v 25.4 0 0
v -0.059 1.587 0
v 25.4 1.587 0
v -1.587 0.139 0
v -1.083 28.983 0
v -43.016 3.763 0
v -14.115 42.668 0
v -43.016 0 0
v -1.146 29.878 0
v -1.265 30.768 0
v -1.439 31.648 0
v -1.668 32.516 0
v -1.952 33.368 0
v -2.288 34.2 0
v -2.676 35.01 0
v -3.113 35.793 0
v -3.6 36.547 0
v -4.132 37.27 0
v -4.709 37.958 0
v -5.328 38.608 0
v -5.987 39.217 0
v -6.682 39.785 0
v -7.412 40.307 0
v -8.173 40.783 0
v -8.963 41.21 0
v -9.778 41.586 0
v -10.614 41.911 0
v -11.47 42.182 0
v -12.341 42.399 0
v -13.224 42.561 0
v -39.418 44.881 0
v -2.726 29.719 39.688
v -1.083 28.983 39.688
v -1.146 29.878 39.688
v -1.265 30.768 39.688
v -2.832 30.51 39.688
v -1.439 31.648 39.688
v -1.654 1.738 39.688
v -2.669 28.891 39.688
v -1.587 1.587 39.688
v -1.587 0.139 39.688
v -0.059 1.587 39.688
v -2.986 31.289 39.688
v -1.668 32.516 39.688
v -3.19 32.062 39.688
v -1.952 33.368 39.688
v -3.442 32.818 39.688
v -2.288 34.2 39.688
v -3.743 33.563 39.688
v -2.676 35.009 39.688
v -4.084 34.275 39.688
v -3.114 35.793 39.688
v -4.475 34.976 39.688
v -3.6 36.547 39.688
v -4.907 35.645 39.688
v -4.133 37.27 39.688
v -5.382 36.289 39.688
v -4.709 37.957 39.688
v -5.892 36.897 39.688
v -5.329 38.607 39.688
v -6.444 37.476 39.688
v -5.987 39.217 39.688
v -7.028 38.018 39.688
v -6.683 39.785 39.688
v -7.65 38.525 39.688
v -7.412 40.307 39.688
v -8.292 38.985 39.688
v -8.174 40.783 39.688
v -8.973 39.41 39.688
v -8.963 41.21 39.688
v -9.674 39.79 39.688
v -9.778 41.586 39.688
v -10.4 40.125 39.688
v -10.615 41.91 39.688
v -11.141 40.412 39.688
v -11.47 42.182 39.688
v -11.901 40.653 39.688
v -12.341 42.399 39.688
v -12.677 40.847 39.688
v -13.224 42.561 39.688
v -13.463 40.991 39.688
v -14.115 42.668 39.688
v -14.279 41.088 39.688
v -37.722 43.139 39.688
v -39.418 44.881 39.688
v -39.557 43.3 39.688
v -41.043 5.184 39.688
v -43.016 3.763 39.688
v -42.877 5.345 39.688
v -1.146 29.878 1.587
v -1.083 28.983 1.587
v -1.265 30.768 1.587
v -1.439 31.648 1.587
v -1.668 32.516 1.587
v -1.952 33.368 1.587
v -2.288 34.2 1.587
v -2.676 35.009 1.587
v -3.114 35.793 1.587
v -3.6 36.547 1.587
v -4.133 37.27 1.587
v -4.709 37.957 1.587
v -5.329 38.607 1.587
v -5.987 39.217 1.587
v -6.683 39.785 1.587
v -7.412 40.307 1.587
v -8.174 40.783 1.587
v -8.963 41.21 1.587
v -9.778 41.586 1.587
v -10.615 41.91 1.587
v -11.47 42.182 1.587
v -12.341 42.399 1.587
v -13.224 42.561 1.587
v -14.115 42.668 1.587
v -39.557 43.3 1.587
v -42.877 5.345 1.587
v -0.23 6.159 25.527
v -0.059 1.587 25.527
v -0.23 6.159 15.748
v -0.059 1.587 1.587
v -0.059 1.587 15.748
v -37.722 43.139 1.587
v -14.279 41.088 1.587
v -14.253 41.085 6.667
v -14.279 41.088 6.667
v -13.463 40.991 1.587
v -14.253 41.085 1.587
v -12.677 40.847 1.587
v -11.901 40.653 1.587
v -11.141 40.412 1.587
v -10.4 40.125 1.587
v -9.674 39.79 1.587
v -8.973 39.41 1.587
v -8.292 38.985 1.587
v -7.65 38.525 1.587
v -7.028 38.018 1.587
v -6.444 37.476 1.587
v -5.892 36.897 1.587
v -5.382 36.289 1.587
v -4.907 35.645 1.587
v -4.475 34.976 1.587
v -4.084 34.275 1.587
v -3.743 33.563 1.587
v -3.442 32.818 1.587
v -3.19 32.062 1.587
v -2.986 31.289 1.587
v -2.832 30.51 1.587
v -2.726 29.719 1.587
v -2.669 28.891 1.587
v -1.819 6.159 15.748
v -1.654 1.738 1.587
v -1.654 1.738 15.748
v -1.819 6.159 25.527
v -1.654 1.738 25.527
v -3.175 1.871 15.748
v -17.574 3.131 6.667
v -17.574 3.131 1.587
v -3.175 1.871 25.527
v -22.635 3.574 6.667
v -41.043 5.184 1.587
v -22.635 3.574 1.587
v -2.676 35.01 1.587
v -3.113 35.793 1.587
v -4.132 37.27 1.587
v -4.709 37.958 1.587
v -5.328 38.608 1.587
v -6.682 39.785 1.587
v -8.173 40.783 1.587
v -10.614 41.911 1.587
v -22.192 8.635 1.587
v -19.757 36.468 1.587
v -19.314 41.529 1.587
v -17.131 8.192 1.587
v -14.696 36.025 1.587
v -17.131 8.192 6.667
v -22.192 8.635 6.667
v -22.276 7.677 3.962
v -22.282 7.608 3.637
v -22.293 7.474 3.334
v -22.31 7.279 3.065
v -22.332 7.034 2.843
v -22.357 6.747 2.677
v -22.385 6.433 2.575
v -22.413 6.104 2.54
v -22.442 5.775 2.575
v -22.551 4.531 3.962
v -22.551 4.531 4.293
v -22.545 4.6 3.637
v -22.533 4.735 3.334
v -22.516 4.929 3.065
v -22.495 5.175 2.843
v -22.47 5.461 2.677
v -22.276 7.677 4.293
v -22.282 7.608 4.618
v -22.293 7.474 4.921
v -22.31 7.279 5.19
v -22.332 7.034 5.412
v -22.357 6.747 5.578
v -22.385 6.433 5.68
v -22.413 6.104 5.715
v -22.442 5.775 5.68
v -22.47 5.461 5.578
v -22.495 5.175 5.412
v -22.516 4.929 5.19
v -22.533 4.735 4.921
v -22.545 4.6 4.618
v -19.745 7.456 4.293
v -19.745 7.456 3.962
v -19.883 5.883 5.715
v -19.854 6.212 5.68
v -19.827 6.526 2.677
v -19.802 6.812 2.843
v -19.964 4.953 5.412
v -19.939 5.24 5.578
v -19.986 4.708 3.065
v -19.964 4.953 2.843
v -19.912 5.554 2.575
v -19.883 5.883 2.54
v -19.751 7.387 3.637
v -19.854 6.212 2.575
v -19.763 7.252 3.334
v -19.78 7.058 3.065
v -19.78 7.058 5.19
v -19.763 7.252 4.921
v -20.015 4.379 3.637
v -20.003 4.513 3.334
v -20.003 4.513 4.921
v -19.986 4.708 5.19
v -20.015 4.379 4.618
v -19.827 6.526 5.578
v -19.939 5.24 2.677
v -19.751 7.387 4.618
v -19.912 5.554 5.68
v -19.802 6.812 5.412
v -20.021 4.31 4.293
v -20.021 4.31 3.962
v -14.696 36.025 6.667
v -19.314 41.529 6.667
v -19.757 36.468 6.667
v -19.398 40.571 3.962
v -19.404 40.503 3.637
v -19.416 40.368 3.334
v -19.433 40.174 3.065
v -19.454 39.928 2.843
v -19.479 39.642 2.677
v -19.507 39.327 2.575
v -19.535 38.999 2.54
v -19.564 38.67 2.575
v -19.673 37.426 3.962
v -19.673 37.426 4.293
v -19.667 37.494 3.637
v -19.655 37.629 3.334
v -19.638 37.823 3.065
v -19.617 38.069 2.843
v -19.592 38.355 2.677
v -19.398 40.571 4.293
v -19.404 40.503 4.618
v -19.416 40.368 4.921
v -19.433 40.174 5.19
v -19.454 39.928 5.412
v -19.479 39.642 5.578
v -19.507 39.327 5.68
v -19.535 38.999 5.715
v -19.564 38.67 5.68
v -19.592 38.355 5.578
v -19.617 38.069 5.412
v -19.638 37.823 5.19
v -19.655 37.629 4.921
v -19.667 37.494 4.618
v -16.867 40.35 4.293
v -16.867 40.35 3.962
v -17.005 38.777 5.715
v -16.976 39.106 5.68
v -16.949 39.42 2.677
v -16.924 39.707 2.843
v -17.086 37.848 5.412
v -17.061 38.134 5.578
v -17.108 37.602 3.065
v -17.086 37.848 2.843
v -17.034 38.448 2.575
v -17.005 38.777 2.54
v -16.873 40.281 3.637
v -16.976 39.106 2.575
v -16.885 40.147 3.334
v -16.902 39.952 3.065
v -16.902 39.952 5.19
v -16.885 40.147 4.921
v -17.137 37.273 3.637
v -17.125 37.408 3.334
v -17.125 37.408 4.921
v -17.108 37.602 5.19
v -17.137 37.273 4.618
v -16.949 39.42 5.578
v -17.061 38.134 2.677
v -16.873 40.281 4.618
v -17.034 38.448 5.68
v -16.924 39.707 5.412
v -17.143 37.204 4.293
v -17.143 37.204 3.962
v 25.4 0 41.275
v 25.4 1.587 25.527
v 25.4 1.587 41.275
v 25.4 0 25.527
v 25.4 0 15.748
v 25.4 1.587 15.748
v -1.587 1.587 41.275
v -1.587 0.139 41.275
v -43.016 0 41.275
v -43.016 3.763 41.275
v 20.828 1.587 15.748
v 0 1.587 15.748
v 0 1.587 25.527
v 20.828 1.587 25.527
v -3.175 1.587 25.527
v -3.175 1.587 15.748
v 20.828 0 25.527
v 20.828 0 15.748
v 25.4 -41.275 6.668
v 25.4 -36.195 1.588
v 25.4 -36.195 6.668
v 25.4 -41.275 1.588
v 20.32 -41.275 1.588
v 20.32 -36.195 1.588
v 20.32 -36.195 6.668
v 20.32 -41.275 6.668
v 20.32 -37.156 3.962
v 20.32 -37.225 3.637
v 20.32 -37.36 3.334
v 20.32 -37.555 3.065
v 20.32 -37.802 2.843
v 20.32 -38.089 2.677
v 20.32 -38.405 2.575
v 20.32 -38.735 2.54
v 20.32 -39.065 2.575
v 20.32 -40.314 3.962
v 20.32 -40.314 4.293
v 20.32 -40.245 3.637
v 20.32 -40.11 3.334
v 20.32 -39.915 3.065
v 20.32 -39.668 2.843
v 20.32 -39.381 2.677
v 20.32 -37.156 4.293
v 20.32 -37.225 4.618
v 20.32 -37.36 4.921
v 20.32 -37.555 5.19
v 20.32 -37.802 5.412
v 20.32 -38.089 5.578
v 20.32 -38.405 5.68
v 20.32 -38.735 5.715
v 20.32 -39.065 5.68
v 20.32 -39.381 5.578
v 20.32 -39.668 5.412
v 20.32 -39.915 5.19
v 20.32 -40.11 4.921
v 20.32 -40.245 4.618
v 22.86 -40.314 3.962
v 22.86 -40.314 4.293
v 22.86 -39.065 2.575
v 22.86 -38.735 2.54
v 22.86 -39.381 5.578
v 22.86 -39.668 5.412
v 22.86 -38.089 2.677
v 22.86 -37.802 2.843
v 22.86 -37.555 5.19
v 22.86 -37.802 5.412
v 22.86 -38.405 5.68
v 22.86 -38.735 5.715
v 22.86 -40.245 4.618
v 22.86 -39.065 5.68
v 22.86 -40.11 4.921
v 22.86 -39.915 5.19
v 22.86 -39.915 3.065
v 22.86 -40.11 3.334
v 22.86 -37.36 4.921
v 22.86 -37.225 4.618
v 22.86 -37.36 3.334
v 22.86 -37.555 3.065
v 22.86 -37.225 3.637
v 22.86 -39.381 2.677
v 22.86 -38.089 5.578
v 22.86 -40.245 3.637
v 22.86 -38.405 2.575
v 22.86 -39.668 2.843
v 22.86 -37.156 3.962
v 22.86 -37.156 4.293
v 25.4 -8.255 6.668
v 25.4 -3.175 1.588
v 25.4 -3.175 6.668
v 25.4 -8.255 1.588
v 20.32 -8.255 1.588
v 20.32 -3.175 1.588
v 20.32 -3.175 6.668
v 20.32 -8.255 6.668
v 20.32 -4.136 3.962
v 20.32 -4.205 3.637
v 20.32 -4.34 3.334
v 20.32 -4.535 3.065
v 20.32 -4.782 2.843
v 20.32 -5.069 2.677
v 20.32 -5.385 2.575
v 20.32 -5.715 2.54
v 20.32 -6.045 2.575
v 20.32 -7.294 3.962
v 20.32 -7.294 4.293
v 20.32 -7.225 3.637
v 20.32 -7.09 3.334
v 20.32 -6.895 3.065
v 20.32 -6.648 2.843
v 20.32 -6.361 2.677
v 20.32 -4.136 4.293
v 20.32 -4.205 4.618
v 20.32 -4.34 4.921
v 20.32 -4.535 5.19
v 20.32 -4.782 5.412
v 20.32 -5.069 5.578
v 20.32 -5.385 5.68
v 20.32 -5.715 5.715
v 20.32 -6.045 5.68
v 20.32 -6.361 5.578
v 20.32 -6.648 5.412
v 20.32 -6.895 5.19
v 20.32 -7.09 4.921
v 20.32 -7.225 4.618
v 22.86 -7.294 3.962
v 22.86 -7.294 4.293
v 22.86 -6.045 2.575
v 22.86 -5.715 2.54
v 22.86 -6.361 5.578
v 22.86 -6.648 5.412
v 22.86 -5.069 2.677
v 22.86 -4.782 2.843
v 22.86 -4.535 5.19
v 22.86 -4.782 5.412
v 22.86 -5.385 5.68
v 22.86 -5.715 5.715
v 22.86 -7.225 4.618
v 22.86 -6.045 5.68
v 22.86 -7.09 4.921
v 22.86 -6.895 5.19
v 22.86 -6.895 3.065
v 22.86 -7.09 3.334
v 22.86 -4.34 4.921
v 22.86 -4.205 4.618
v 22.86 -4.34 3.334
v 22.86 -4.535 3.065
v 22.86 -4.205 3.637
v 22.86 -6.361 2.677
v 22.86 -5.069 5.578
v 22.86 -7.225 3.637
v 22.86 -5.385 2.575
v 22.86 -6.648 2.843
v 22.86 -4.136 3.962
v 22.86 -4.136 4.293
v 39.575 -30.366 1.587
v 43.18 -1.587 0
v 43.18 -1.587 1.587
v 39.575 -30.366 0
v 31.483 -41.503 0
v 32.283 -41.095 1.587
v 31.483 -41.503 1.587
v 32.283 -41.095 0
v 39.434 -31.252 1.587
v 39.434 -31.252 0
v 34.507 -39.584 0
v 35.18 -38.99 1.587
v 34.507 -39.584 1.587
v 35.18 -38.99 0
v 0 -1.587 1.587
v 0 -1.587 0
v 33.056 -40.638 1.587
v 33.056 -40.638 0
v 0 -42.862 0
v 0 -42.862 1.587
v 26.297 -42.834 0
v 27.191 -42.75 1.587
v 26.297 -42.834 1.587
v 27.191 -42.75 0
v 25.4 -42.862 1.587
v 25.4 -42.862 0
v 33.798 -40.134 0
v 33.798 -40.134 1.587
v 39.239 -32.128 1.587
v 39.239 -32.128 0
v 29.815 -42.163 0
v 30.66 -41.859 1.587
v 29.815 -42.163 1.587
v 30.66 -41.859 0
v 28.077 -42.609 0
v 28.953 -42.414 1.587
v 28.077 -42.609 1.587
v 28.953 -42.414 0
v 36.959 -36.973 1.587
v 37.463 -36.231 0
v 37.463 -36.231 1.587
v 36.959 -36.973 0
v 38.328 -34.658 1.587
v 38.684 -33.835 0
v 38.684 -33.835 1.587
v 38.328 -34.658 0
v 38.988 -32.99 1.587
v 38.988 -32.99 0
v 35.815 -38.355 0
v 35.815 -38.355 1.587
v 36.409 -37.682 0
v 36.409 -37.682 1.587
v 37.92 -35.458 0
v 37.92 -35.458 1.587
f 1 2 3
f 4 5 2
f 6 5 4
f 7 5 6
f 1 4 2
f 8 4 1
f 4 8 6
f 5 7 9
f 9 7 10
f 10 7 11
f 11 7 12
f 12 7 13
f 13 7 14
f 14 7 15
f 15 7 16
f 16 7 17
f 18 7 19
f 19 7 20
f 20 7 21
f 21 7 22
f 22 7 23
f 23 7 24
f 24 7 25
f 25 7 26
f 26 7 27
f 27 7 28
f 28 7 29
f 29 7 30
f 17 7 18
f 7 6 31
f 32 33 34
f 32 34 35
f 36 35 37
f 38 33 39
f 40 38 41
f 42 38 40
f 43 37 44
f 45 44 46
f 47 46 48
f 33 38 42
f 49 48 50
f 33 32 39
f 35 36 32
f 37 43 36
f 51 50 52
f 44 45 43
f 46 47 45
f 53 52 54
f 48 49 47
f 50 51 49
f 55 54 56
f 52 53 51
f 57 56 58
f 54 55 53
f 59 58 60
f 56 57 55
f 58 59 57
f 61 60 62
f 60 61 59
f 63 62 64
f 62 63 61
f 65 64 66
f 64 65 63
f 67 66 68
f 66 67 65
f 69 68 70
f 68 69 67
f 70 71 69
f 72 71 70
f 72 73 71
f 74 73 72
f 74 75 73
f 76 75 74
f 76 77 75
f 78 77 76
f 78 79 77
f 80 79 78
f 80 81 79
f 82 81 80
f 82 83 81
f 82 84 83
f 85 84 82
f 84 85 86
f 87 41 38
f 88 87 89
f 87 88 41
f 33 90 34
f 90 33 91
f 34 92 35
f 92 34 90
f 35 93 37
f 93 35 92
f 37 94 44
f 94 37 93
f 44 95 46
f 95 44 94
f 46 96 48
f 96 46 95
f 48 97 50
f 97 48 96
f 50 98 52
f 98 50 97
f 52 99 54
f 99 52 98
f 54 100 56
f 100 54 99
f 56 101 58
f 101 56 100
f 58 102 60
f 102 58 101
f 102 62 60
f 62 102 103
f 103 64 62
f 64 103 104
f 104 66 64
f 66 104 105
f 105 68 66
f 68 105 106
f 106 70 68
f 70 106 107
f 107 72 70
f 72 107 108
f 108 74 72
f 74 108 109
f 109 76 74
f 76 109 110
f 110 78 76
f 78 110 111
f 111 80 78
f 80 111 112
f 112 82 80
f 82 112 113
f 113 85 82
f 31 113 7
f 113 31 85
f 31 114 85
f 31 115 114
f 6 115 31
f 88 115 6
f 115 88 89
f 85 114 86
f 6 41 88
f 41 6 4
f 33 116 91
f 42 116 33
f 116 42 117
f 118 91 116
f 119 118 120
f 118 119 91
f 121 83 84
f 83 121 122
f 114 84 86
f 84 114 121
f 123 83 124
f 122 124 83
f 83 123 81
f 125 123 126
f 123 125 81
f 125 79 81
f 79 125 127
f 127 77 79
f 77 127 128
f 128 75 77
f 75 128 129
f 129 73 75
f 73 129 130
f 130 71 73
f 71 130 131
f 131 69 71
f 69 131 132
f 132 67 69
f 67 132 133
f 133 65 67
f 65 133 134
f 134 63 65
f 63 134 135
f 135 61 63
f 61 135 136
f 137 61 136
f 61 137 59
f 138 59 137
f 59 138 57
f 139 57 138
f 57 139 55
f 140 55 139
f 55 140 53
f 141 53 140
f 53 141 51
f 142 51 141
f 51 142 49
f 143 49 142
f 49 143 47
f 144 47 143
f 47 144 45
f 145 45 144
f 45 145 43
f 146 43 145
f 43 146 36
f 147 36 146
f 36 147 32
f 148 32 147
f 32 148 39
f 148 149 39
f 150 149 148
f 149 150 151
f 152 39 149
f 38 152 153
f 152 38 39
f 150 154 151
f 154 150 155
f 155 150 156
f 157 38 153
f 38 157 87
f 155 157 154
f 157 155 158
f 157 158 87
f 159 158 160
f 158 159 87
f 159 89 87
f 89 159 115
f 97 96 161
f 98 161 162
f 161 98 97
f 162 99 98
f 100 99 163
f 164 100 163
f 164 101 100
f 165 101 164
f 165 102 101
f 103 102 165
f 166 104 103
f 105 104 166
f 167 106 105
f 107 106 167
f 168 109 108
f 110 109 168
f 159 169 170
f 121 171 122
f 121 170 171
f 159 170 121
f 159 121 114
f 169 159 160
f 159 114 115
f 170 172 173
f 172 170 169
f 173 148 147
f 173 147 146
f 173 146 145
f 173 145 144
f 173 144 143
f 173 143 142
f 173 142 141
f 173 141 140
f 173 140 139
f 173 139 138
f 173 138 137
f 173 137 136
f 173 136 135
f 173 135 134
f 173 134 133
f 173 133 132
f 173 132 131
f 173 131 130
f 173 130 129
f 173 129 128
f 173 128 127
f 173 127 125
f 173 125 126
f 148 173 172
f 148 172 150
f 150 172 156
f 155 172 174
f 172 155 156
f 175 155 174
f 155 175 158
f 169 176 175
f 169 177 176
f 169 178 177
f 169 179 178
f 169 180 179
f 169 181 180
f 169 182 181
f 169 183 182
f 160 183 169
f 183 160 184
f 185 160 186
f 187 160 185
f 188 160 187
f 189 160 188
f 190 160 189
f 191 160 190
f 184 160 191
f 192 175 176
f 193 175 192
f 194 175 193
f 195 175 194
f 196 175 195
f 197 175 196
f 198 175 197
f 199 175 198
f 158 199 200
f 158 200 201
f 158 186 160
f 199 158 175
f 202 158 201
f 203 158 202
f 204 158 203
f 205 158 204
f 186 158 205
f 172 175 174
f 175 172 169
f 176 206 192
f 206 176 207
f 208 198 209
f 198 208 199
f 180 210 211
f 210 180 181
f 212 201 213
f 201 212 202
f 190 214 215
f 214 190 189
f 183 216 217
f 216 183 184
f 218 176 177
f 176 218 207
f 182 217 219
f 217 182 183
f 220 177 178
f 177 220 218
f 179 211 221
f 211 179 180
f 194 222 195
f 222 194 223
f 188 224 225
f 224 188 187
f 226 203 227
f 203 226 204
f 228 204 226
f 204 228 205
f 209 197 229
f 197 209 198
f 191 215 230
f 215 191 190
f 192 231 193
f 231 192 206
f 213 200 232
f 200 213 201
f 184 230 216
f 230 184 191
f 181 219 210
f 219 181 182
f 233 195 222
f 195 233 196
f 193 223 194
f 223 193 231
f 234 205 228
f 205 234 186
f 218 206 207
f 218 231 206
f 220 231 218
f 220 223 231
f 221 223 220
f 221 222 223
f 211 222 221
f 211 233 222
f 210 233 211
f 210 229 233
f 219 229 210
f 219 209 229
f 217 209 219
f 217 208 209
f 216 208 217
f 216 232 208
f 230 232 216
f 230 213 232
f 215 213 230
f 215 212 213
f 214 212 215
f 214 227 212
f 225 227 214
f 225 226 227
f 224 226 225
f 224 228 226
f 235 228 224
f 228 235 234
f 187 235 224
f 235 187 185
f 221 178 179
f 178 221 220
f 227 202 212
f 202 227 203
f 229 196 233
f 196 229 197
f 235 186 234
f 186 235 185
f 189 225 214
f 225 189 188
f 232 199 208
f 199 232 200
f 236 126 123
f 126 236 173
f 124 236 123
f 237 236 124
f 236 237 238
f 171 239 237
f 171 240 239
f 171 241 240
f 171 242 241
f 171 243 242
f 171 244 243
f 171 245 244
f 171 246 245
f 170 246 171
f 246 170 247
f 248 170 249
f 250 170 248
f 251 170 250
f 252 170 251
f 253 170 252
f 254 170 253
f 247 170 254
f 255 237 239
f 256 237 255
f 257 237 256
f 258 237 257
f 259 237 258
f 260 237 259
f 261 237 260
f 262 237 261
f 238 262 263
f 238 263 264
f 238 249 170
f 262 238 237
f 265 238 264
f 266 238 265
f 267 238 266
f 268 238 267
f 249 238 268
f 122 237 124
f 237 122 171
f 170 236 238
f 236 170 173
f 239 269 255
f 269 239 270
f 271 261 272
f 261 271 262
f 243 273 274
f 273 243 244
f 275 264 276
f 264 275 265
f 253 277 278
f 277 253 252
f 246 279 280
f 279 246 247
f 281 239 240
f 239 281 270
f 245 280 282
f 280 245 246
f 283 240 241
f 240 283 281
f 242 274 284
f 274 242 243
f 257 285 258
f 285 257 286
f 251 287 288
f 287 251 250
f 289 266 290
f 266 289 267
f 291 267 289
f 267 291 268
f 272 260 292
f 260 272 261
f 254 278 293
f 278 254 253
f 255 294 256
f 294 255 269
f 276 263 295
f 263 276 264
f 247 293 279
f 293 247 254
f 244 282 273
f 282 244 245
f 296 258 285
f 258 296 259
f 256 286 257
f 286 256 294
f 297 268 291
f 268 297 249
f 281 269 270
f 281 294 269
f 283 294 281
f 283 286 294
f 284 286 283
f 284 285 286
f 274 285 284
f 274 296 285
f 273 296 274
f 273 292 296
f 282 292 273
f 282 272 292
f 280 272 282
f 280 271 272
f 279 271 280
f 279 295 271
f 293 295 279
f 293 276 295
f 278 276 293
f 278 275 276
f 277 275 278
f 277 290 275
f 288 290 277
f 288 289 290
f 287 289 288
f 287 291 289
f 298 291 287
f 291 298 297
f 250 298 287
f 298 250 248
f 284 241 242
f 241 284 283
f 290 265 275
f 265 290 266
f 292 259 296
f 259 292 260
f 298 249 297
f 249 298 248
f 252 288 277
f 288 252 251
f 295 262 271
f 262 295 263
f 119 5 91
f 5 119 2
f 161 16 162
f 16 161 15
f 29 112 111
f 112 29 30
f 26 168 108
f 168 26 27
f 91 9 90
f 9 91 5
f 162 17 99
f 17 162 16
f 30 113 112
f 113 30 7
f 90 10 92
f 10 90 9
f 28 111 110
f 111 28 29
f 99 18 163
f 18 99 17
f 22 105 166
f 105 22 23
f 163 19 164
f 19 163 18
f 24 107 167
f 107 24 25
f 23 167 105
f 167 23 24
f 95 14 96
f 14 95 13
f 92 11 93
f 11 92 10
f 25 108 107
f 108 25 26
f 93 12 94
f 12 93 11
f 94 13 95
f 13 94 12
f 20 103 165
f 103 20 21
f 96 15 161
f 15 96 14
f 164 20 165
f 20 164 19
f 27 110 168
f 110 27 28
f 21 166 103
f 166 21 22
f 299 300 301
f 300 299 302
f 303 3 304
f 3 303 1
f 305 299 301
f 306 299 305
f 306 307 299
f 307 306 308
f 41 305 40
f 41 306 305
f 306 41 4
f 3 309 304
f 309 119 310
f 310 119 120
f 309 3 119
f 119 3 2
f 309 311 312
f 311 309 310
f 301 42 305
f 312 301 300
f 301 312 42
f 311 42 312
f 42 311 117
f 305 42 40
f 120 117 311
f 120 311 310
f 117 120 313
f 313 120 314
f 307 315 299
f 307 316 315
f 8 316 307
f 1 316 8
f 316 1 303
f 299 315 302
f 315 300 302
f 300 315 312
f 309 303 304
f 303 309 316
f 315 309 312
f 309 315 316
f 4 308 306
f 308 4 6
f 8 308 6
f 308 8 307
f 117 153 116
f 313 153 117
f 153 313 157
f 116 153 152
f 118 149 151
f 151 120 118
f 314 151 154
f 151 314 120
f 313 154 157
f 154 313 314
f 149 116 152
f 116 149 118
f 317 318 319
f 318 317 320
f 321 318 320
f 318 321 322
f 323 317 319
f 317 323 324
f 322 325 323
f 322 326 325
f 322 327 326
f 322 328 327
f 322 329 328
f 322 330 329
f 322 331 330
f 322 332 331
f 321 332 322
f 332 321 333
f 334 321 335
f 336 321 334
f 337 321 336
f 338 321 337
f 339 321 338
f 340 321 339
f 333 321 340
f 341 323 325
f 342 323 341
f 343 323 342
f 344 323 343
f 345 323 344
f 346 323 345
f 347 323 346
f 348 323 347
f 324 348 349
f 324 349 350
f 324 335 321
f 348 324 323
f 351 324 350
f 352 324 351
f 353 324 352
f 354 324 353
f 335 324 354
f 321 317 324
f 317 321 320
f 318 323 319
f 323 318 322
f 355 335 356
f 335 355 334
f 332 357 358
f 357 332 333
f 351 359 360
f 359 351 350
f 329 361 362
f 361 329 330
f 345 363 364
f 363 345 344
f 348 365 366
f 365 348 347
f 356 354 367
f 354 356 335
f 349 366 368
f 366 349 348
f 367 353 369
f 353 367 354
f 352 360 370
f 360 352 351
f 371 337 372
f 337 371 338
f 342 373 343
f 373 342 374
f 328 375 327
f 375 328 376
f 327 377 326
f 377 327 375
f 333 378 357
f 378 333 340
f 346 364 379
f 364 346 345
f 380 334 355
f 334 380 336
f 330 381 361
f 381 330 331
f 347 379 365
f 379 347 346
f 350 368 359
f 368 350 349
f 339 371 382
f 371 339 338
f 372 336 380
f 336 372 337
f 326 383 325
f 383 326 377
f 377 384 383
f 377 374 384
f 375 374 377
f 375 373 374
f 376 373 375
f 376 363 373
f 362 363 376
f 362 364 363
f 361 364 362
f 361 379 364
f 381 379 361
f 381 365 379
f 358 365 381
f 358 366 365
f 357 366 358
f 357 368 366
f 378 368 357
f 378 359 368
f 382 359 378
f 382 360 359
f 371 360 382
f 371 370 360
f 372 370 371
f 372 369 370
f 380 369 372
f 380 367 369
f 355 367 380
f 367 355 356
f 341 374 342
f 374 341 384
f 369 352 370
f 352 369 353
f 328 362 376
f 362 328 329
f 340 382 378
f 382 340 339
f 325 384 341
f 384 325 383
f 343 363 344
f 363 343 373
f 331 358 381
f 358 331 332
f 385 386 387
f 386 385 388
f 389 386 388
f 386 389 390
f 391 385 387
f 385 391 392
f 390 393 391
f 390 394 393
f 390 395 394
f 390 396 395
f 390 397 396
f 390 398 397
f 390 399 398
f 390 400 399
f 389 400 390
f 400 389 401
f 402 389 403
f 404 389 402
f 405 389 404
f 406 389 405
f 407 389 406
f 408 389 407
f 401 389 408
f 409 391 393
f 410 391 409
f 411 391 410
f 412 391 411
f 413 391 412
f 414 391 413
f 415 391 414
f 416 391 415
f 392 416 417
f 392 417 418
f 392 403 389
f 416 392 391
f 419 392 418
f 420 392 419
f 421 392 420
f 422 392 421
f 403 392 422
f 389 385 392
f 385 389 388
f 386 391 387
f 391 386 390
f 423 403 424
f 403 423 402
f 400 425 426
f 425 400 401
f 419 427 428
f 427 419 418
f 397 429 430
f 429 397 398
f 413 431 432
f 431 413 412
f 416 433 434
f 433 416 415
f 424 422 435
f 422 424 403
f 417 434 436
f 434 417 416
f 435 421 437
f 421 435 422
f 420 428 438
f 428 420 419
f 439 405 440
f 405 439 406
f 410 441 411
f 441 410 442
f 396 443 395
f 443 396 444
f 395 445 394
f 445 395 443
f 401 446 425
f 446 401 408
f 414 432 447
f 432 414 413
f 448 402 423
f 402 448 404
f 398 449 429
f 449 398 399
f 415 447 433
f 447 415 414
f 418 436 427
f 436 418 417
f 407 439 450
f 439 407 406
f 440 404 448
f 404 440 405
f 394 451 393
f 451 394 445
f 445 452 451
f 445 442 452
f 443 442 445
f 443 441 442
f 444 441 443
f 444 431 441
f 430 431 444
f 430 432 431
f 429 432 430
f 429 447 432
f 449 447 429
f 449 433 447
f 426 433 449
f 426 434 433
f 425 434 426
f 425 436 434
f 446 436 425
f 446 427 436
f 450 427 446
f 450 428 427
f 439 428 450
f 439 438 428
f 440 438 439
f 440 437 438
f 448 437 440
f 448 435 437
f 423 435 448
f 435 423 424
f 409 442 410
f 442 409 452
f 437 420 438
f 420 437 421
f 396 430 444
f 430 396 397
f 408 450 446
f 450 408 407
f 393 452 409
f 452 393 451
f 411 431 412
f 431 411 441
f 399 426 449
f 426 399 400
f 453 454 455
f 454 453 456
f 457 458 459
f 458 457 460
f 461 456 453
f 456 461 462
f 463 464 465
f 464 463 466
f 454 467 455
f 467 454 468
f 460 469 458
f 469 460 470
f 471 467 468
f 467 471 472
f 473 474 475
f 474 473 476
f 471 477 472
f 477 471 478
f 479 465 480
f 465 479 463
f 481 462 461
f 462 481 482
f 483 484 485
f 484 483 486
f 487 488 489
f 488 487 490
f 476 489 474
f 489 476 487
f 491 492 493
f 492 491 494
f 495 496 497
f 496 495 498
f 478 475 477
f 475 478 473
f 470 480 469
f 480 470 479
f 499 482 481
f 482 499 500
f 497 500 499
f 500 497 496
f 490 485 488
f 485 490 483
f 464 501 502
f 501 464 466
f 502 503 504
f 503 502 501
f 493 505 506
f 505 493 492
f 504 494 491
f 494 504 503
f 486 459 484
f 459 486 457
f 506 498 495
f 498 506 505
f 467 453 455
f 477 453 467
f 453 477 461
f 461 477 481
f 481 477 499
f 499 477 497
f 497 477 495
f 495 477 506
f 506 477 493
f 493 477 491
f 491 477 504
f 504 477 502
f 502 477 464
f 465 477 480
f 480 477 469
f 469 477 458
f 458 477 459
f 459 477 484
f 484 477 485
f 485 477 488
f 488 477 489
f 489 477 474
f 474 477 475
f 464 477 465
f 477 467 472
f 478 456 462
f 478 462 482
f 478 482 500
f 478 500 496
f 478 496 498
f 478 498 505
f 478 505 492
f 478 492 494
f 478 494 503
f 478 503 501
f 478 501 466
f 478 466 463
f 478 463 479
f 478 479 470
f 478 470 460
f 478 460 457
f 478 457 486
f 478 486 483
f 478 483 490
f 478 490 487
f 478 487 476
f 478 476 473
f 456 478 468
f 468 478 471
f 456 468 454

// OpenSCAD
//square( size = .1, center = false);
//translate ([0,1.525,0])
//  square( size = .1, center = false);

lens=.8;
thickness = 0.0625;
eps=.01;
base_length = 1.7;
up_angle = 5;
camera_size = 1.5;
rear_tab_length = 1;
  // Length of tab extended from rear of housing
rear_tab_thickness = thickness;

wire_port_w = .385;
wire_port_h = .18;
  // Size of rear opening for camera
  //  connector
  
module shape (){
// 2D
  hull()
  {
    square( size = .1, center = false);
    translate ([0,camera_size + thickness,0])
      square( size = thickness, center = false);
    polygon(points=[[base_length,0],
                    [1.6,0],
                    [1.65,.1],
                    [base_length,0]], 
            convexity=10);
    translate([1,1+thickness,0]) 
      circle(r=.5+thickness,$fn=100);
  }
}

module mount (){
  difference(){
  cube([.2,.2,.2], false);
  translate ([0,.1,.1])
      rotate([0,90,0])
      cylinder(0.2, .0625,.0625, true, $fn = 30);
  }
}

module main_box() {
  difference(){
    {
      {   
        linear_extrude(height = camera_size + thickness, 
                       center = false, 
                       convexity = 2, 
                       twist = 0,                      
                       slices = 10, 
                       scale = 1){
          difference(){
            shape ();
            offset(r=-thickness){ 
              shape ();
              }
            }
          }
        } 
      }
      {
        translate([-eps, thickness, thickness])
         cube([thickness+eps*2,
               camera_size,
               camera_size], 
              center = false);
      }
    }

    linear_extrude(height = thickness, 
                   center = false, 
                   convexity = 2, 
                   twist = 0, 
                   slices = 10, 
                   scale = 1)
      shape();
  translate([lens,thickness,thickness])mount();
  translate([lens,thickness+1.3,thickness])mount();
}

scale(25.4) {
difference() {
  {
    union() {
      rotate([0,0,-up_angle])
        translate ([-base_length, 0, 0])
          main_box();
      linear_extrude(height = 2*thickness+camera_size, 
                     center = false, 
                     convexity = 2, 
                     twist = 0, 
                     slices = 10, 
                     scale = 1)
      polygon(points=[[0,0],
                      [-base_length*cos(up_angle),
                       0],
                      [-base_length*cos(up_angle),
                        base_length*sin(up_angle)], 
                      [0,0]], 
                     convexity=10);
      difference() {
        translate([-thickness, 0, 0])
          cube([thickness+rear_tab_length, 
                rear_tab_thickness,     
                thickness*2+camera_size]);
        translate([rear_tab_length-wire_port_h, 0, camera_size/2-wire_port_w/2+thickness])
          cube([wire_port_h, rear_tab_thickness, wire_port_w]);
      }
    }
  }
  translate([-2*thickness,
             thickness, 
             thickness+camera_size/2-wire_port_w/2])
    cube([thickness*2, wire_port_h, wire_port_w], 
         center = false);
}

translate([0, -thickness, camera_size+thickness*2])
rotate([180,0,0]){
  translate([0,0,camera_size+thickness]) 
    linear_extrude(height = thickness, center = false, convexity = 2, twist = 0, slices = 10, scale = 1){
      shape();
      }
  translate([lens,thickness+1.3,thickness+1.3])mount();
  translate([lens,thickness,thickness+1.3])mount();  
  }
}
